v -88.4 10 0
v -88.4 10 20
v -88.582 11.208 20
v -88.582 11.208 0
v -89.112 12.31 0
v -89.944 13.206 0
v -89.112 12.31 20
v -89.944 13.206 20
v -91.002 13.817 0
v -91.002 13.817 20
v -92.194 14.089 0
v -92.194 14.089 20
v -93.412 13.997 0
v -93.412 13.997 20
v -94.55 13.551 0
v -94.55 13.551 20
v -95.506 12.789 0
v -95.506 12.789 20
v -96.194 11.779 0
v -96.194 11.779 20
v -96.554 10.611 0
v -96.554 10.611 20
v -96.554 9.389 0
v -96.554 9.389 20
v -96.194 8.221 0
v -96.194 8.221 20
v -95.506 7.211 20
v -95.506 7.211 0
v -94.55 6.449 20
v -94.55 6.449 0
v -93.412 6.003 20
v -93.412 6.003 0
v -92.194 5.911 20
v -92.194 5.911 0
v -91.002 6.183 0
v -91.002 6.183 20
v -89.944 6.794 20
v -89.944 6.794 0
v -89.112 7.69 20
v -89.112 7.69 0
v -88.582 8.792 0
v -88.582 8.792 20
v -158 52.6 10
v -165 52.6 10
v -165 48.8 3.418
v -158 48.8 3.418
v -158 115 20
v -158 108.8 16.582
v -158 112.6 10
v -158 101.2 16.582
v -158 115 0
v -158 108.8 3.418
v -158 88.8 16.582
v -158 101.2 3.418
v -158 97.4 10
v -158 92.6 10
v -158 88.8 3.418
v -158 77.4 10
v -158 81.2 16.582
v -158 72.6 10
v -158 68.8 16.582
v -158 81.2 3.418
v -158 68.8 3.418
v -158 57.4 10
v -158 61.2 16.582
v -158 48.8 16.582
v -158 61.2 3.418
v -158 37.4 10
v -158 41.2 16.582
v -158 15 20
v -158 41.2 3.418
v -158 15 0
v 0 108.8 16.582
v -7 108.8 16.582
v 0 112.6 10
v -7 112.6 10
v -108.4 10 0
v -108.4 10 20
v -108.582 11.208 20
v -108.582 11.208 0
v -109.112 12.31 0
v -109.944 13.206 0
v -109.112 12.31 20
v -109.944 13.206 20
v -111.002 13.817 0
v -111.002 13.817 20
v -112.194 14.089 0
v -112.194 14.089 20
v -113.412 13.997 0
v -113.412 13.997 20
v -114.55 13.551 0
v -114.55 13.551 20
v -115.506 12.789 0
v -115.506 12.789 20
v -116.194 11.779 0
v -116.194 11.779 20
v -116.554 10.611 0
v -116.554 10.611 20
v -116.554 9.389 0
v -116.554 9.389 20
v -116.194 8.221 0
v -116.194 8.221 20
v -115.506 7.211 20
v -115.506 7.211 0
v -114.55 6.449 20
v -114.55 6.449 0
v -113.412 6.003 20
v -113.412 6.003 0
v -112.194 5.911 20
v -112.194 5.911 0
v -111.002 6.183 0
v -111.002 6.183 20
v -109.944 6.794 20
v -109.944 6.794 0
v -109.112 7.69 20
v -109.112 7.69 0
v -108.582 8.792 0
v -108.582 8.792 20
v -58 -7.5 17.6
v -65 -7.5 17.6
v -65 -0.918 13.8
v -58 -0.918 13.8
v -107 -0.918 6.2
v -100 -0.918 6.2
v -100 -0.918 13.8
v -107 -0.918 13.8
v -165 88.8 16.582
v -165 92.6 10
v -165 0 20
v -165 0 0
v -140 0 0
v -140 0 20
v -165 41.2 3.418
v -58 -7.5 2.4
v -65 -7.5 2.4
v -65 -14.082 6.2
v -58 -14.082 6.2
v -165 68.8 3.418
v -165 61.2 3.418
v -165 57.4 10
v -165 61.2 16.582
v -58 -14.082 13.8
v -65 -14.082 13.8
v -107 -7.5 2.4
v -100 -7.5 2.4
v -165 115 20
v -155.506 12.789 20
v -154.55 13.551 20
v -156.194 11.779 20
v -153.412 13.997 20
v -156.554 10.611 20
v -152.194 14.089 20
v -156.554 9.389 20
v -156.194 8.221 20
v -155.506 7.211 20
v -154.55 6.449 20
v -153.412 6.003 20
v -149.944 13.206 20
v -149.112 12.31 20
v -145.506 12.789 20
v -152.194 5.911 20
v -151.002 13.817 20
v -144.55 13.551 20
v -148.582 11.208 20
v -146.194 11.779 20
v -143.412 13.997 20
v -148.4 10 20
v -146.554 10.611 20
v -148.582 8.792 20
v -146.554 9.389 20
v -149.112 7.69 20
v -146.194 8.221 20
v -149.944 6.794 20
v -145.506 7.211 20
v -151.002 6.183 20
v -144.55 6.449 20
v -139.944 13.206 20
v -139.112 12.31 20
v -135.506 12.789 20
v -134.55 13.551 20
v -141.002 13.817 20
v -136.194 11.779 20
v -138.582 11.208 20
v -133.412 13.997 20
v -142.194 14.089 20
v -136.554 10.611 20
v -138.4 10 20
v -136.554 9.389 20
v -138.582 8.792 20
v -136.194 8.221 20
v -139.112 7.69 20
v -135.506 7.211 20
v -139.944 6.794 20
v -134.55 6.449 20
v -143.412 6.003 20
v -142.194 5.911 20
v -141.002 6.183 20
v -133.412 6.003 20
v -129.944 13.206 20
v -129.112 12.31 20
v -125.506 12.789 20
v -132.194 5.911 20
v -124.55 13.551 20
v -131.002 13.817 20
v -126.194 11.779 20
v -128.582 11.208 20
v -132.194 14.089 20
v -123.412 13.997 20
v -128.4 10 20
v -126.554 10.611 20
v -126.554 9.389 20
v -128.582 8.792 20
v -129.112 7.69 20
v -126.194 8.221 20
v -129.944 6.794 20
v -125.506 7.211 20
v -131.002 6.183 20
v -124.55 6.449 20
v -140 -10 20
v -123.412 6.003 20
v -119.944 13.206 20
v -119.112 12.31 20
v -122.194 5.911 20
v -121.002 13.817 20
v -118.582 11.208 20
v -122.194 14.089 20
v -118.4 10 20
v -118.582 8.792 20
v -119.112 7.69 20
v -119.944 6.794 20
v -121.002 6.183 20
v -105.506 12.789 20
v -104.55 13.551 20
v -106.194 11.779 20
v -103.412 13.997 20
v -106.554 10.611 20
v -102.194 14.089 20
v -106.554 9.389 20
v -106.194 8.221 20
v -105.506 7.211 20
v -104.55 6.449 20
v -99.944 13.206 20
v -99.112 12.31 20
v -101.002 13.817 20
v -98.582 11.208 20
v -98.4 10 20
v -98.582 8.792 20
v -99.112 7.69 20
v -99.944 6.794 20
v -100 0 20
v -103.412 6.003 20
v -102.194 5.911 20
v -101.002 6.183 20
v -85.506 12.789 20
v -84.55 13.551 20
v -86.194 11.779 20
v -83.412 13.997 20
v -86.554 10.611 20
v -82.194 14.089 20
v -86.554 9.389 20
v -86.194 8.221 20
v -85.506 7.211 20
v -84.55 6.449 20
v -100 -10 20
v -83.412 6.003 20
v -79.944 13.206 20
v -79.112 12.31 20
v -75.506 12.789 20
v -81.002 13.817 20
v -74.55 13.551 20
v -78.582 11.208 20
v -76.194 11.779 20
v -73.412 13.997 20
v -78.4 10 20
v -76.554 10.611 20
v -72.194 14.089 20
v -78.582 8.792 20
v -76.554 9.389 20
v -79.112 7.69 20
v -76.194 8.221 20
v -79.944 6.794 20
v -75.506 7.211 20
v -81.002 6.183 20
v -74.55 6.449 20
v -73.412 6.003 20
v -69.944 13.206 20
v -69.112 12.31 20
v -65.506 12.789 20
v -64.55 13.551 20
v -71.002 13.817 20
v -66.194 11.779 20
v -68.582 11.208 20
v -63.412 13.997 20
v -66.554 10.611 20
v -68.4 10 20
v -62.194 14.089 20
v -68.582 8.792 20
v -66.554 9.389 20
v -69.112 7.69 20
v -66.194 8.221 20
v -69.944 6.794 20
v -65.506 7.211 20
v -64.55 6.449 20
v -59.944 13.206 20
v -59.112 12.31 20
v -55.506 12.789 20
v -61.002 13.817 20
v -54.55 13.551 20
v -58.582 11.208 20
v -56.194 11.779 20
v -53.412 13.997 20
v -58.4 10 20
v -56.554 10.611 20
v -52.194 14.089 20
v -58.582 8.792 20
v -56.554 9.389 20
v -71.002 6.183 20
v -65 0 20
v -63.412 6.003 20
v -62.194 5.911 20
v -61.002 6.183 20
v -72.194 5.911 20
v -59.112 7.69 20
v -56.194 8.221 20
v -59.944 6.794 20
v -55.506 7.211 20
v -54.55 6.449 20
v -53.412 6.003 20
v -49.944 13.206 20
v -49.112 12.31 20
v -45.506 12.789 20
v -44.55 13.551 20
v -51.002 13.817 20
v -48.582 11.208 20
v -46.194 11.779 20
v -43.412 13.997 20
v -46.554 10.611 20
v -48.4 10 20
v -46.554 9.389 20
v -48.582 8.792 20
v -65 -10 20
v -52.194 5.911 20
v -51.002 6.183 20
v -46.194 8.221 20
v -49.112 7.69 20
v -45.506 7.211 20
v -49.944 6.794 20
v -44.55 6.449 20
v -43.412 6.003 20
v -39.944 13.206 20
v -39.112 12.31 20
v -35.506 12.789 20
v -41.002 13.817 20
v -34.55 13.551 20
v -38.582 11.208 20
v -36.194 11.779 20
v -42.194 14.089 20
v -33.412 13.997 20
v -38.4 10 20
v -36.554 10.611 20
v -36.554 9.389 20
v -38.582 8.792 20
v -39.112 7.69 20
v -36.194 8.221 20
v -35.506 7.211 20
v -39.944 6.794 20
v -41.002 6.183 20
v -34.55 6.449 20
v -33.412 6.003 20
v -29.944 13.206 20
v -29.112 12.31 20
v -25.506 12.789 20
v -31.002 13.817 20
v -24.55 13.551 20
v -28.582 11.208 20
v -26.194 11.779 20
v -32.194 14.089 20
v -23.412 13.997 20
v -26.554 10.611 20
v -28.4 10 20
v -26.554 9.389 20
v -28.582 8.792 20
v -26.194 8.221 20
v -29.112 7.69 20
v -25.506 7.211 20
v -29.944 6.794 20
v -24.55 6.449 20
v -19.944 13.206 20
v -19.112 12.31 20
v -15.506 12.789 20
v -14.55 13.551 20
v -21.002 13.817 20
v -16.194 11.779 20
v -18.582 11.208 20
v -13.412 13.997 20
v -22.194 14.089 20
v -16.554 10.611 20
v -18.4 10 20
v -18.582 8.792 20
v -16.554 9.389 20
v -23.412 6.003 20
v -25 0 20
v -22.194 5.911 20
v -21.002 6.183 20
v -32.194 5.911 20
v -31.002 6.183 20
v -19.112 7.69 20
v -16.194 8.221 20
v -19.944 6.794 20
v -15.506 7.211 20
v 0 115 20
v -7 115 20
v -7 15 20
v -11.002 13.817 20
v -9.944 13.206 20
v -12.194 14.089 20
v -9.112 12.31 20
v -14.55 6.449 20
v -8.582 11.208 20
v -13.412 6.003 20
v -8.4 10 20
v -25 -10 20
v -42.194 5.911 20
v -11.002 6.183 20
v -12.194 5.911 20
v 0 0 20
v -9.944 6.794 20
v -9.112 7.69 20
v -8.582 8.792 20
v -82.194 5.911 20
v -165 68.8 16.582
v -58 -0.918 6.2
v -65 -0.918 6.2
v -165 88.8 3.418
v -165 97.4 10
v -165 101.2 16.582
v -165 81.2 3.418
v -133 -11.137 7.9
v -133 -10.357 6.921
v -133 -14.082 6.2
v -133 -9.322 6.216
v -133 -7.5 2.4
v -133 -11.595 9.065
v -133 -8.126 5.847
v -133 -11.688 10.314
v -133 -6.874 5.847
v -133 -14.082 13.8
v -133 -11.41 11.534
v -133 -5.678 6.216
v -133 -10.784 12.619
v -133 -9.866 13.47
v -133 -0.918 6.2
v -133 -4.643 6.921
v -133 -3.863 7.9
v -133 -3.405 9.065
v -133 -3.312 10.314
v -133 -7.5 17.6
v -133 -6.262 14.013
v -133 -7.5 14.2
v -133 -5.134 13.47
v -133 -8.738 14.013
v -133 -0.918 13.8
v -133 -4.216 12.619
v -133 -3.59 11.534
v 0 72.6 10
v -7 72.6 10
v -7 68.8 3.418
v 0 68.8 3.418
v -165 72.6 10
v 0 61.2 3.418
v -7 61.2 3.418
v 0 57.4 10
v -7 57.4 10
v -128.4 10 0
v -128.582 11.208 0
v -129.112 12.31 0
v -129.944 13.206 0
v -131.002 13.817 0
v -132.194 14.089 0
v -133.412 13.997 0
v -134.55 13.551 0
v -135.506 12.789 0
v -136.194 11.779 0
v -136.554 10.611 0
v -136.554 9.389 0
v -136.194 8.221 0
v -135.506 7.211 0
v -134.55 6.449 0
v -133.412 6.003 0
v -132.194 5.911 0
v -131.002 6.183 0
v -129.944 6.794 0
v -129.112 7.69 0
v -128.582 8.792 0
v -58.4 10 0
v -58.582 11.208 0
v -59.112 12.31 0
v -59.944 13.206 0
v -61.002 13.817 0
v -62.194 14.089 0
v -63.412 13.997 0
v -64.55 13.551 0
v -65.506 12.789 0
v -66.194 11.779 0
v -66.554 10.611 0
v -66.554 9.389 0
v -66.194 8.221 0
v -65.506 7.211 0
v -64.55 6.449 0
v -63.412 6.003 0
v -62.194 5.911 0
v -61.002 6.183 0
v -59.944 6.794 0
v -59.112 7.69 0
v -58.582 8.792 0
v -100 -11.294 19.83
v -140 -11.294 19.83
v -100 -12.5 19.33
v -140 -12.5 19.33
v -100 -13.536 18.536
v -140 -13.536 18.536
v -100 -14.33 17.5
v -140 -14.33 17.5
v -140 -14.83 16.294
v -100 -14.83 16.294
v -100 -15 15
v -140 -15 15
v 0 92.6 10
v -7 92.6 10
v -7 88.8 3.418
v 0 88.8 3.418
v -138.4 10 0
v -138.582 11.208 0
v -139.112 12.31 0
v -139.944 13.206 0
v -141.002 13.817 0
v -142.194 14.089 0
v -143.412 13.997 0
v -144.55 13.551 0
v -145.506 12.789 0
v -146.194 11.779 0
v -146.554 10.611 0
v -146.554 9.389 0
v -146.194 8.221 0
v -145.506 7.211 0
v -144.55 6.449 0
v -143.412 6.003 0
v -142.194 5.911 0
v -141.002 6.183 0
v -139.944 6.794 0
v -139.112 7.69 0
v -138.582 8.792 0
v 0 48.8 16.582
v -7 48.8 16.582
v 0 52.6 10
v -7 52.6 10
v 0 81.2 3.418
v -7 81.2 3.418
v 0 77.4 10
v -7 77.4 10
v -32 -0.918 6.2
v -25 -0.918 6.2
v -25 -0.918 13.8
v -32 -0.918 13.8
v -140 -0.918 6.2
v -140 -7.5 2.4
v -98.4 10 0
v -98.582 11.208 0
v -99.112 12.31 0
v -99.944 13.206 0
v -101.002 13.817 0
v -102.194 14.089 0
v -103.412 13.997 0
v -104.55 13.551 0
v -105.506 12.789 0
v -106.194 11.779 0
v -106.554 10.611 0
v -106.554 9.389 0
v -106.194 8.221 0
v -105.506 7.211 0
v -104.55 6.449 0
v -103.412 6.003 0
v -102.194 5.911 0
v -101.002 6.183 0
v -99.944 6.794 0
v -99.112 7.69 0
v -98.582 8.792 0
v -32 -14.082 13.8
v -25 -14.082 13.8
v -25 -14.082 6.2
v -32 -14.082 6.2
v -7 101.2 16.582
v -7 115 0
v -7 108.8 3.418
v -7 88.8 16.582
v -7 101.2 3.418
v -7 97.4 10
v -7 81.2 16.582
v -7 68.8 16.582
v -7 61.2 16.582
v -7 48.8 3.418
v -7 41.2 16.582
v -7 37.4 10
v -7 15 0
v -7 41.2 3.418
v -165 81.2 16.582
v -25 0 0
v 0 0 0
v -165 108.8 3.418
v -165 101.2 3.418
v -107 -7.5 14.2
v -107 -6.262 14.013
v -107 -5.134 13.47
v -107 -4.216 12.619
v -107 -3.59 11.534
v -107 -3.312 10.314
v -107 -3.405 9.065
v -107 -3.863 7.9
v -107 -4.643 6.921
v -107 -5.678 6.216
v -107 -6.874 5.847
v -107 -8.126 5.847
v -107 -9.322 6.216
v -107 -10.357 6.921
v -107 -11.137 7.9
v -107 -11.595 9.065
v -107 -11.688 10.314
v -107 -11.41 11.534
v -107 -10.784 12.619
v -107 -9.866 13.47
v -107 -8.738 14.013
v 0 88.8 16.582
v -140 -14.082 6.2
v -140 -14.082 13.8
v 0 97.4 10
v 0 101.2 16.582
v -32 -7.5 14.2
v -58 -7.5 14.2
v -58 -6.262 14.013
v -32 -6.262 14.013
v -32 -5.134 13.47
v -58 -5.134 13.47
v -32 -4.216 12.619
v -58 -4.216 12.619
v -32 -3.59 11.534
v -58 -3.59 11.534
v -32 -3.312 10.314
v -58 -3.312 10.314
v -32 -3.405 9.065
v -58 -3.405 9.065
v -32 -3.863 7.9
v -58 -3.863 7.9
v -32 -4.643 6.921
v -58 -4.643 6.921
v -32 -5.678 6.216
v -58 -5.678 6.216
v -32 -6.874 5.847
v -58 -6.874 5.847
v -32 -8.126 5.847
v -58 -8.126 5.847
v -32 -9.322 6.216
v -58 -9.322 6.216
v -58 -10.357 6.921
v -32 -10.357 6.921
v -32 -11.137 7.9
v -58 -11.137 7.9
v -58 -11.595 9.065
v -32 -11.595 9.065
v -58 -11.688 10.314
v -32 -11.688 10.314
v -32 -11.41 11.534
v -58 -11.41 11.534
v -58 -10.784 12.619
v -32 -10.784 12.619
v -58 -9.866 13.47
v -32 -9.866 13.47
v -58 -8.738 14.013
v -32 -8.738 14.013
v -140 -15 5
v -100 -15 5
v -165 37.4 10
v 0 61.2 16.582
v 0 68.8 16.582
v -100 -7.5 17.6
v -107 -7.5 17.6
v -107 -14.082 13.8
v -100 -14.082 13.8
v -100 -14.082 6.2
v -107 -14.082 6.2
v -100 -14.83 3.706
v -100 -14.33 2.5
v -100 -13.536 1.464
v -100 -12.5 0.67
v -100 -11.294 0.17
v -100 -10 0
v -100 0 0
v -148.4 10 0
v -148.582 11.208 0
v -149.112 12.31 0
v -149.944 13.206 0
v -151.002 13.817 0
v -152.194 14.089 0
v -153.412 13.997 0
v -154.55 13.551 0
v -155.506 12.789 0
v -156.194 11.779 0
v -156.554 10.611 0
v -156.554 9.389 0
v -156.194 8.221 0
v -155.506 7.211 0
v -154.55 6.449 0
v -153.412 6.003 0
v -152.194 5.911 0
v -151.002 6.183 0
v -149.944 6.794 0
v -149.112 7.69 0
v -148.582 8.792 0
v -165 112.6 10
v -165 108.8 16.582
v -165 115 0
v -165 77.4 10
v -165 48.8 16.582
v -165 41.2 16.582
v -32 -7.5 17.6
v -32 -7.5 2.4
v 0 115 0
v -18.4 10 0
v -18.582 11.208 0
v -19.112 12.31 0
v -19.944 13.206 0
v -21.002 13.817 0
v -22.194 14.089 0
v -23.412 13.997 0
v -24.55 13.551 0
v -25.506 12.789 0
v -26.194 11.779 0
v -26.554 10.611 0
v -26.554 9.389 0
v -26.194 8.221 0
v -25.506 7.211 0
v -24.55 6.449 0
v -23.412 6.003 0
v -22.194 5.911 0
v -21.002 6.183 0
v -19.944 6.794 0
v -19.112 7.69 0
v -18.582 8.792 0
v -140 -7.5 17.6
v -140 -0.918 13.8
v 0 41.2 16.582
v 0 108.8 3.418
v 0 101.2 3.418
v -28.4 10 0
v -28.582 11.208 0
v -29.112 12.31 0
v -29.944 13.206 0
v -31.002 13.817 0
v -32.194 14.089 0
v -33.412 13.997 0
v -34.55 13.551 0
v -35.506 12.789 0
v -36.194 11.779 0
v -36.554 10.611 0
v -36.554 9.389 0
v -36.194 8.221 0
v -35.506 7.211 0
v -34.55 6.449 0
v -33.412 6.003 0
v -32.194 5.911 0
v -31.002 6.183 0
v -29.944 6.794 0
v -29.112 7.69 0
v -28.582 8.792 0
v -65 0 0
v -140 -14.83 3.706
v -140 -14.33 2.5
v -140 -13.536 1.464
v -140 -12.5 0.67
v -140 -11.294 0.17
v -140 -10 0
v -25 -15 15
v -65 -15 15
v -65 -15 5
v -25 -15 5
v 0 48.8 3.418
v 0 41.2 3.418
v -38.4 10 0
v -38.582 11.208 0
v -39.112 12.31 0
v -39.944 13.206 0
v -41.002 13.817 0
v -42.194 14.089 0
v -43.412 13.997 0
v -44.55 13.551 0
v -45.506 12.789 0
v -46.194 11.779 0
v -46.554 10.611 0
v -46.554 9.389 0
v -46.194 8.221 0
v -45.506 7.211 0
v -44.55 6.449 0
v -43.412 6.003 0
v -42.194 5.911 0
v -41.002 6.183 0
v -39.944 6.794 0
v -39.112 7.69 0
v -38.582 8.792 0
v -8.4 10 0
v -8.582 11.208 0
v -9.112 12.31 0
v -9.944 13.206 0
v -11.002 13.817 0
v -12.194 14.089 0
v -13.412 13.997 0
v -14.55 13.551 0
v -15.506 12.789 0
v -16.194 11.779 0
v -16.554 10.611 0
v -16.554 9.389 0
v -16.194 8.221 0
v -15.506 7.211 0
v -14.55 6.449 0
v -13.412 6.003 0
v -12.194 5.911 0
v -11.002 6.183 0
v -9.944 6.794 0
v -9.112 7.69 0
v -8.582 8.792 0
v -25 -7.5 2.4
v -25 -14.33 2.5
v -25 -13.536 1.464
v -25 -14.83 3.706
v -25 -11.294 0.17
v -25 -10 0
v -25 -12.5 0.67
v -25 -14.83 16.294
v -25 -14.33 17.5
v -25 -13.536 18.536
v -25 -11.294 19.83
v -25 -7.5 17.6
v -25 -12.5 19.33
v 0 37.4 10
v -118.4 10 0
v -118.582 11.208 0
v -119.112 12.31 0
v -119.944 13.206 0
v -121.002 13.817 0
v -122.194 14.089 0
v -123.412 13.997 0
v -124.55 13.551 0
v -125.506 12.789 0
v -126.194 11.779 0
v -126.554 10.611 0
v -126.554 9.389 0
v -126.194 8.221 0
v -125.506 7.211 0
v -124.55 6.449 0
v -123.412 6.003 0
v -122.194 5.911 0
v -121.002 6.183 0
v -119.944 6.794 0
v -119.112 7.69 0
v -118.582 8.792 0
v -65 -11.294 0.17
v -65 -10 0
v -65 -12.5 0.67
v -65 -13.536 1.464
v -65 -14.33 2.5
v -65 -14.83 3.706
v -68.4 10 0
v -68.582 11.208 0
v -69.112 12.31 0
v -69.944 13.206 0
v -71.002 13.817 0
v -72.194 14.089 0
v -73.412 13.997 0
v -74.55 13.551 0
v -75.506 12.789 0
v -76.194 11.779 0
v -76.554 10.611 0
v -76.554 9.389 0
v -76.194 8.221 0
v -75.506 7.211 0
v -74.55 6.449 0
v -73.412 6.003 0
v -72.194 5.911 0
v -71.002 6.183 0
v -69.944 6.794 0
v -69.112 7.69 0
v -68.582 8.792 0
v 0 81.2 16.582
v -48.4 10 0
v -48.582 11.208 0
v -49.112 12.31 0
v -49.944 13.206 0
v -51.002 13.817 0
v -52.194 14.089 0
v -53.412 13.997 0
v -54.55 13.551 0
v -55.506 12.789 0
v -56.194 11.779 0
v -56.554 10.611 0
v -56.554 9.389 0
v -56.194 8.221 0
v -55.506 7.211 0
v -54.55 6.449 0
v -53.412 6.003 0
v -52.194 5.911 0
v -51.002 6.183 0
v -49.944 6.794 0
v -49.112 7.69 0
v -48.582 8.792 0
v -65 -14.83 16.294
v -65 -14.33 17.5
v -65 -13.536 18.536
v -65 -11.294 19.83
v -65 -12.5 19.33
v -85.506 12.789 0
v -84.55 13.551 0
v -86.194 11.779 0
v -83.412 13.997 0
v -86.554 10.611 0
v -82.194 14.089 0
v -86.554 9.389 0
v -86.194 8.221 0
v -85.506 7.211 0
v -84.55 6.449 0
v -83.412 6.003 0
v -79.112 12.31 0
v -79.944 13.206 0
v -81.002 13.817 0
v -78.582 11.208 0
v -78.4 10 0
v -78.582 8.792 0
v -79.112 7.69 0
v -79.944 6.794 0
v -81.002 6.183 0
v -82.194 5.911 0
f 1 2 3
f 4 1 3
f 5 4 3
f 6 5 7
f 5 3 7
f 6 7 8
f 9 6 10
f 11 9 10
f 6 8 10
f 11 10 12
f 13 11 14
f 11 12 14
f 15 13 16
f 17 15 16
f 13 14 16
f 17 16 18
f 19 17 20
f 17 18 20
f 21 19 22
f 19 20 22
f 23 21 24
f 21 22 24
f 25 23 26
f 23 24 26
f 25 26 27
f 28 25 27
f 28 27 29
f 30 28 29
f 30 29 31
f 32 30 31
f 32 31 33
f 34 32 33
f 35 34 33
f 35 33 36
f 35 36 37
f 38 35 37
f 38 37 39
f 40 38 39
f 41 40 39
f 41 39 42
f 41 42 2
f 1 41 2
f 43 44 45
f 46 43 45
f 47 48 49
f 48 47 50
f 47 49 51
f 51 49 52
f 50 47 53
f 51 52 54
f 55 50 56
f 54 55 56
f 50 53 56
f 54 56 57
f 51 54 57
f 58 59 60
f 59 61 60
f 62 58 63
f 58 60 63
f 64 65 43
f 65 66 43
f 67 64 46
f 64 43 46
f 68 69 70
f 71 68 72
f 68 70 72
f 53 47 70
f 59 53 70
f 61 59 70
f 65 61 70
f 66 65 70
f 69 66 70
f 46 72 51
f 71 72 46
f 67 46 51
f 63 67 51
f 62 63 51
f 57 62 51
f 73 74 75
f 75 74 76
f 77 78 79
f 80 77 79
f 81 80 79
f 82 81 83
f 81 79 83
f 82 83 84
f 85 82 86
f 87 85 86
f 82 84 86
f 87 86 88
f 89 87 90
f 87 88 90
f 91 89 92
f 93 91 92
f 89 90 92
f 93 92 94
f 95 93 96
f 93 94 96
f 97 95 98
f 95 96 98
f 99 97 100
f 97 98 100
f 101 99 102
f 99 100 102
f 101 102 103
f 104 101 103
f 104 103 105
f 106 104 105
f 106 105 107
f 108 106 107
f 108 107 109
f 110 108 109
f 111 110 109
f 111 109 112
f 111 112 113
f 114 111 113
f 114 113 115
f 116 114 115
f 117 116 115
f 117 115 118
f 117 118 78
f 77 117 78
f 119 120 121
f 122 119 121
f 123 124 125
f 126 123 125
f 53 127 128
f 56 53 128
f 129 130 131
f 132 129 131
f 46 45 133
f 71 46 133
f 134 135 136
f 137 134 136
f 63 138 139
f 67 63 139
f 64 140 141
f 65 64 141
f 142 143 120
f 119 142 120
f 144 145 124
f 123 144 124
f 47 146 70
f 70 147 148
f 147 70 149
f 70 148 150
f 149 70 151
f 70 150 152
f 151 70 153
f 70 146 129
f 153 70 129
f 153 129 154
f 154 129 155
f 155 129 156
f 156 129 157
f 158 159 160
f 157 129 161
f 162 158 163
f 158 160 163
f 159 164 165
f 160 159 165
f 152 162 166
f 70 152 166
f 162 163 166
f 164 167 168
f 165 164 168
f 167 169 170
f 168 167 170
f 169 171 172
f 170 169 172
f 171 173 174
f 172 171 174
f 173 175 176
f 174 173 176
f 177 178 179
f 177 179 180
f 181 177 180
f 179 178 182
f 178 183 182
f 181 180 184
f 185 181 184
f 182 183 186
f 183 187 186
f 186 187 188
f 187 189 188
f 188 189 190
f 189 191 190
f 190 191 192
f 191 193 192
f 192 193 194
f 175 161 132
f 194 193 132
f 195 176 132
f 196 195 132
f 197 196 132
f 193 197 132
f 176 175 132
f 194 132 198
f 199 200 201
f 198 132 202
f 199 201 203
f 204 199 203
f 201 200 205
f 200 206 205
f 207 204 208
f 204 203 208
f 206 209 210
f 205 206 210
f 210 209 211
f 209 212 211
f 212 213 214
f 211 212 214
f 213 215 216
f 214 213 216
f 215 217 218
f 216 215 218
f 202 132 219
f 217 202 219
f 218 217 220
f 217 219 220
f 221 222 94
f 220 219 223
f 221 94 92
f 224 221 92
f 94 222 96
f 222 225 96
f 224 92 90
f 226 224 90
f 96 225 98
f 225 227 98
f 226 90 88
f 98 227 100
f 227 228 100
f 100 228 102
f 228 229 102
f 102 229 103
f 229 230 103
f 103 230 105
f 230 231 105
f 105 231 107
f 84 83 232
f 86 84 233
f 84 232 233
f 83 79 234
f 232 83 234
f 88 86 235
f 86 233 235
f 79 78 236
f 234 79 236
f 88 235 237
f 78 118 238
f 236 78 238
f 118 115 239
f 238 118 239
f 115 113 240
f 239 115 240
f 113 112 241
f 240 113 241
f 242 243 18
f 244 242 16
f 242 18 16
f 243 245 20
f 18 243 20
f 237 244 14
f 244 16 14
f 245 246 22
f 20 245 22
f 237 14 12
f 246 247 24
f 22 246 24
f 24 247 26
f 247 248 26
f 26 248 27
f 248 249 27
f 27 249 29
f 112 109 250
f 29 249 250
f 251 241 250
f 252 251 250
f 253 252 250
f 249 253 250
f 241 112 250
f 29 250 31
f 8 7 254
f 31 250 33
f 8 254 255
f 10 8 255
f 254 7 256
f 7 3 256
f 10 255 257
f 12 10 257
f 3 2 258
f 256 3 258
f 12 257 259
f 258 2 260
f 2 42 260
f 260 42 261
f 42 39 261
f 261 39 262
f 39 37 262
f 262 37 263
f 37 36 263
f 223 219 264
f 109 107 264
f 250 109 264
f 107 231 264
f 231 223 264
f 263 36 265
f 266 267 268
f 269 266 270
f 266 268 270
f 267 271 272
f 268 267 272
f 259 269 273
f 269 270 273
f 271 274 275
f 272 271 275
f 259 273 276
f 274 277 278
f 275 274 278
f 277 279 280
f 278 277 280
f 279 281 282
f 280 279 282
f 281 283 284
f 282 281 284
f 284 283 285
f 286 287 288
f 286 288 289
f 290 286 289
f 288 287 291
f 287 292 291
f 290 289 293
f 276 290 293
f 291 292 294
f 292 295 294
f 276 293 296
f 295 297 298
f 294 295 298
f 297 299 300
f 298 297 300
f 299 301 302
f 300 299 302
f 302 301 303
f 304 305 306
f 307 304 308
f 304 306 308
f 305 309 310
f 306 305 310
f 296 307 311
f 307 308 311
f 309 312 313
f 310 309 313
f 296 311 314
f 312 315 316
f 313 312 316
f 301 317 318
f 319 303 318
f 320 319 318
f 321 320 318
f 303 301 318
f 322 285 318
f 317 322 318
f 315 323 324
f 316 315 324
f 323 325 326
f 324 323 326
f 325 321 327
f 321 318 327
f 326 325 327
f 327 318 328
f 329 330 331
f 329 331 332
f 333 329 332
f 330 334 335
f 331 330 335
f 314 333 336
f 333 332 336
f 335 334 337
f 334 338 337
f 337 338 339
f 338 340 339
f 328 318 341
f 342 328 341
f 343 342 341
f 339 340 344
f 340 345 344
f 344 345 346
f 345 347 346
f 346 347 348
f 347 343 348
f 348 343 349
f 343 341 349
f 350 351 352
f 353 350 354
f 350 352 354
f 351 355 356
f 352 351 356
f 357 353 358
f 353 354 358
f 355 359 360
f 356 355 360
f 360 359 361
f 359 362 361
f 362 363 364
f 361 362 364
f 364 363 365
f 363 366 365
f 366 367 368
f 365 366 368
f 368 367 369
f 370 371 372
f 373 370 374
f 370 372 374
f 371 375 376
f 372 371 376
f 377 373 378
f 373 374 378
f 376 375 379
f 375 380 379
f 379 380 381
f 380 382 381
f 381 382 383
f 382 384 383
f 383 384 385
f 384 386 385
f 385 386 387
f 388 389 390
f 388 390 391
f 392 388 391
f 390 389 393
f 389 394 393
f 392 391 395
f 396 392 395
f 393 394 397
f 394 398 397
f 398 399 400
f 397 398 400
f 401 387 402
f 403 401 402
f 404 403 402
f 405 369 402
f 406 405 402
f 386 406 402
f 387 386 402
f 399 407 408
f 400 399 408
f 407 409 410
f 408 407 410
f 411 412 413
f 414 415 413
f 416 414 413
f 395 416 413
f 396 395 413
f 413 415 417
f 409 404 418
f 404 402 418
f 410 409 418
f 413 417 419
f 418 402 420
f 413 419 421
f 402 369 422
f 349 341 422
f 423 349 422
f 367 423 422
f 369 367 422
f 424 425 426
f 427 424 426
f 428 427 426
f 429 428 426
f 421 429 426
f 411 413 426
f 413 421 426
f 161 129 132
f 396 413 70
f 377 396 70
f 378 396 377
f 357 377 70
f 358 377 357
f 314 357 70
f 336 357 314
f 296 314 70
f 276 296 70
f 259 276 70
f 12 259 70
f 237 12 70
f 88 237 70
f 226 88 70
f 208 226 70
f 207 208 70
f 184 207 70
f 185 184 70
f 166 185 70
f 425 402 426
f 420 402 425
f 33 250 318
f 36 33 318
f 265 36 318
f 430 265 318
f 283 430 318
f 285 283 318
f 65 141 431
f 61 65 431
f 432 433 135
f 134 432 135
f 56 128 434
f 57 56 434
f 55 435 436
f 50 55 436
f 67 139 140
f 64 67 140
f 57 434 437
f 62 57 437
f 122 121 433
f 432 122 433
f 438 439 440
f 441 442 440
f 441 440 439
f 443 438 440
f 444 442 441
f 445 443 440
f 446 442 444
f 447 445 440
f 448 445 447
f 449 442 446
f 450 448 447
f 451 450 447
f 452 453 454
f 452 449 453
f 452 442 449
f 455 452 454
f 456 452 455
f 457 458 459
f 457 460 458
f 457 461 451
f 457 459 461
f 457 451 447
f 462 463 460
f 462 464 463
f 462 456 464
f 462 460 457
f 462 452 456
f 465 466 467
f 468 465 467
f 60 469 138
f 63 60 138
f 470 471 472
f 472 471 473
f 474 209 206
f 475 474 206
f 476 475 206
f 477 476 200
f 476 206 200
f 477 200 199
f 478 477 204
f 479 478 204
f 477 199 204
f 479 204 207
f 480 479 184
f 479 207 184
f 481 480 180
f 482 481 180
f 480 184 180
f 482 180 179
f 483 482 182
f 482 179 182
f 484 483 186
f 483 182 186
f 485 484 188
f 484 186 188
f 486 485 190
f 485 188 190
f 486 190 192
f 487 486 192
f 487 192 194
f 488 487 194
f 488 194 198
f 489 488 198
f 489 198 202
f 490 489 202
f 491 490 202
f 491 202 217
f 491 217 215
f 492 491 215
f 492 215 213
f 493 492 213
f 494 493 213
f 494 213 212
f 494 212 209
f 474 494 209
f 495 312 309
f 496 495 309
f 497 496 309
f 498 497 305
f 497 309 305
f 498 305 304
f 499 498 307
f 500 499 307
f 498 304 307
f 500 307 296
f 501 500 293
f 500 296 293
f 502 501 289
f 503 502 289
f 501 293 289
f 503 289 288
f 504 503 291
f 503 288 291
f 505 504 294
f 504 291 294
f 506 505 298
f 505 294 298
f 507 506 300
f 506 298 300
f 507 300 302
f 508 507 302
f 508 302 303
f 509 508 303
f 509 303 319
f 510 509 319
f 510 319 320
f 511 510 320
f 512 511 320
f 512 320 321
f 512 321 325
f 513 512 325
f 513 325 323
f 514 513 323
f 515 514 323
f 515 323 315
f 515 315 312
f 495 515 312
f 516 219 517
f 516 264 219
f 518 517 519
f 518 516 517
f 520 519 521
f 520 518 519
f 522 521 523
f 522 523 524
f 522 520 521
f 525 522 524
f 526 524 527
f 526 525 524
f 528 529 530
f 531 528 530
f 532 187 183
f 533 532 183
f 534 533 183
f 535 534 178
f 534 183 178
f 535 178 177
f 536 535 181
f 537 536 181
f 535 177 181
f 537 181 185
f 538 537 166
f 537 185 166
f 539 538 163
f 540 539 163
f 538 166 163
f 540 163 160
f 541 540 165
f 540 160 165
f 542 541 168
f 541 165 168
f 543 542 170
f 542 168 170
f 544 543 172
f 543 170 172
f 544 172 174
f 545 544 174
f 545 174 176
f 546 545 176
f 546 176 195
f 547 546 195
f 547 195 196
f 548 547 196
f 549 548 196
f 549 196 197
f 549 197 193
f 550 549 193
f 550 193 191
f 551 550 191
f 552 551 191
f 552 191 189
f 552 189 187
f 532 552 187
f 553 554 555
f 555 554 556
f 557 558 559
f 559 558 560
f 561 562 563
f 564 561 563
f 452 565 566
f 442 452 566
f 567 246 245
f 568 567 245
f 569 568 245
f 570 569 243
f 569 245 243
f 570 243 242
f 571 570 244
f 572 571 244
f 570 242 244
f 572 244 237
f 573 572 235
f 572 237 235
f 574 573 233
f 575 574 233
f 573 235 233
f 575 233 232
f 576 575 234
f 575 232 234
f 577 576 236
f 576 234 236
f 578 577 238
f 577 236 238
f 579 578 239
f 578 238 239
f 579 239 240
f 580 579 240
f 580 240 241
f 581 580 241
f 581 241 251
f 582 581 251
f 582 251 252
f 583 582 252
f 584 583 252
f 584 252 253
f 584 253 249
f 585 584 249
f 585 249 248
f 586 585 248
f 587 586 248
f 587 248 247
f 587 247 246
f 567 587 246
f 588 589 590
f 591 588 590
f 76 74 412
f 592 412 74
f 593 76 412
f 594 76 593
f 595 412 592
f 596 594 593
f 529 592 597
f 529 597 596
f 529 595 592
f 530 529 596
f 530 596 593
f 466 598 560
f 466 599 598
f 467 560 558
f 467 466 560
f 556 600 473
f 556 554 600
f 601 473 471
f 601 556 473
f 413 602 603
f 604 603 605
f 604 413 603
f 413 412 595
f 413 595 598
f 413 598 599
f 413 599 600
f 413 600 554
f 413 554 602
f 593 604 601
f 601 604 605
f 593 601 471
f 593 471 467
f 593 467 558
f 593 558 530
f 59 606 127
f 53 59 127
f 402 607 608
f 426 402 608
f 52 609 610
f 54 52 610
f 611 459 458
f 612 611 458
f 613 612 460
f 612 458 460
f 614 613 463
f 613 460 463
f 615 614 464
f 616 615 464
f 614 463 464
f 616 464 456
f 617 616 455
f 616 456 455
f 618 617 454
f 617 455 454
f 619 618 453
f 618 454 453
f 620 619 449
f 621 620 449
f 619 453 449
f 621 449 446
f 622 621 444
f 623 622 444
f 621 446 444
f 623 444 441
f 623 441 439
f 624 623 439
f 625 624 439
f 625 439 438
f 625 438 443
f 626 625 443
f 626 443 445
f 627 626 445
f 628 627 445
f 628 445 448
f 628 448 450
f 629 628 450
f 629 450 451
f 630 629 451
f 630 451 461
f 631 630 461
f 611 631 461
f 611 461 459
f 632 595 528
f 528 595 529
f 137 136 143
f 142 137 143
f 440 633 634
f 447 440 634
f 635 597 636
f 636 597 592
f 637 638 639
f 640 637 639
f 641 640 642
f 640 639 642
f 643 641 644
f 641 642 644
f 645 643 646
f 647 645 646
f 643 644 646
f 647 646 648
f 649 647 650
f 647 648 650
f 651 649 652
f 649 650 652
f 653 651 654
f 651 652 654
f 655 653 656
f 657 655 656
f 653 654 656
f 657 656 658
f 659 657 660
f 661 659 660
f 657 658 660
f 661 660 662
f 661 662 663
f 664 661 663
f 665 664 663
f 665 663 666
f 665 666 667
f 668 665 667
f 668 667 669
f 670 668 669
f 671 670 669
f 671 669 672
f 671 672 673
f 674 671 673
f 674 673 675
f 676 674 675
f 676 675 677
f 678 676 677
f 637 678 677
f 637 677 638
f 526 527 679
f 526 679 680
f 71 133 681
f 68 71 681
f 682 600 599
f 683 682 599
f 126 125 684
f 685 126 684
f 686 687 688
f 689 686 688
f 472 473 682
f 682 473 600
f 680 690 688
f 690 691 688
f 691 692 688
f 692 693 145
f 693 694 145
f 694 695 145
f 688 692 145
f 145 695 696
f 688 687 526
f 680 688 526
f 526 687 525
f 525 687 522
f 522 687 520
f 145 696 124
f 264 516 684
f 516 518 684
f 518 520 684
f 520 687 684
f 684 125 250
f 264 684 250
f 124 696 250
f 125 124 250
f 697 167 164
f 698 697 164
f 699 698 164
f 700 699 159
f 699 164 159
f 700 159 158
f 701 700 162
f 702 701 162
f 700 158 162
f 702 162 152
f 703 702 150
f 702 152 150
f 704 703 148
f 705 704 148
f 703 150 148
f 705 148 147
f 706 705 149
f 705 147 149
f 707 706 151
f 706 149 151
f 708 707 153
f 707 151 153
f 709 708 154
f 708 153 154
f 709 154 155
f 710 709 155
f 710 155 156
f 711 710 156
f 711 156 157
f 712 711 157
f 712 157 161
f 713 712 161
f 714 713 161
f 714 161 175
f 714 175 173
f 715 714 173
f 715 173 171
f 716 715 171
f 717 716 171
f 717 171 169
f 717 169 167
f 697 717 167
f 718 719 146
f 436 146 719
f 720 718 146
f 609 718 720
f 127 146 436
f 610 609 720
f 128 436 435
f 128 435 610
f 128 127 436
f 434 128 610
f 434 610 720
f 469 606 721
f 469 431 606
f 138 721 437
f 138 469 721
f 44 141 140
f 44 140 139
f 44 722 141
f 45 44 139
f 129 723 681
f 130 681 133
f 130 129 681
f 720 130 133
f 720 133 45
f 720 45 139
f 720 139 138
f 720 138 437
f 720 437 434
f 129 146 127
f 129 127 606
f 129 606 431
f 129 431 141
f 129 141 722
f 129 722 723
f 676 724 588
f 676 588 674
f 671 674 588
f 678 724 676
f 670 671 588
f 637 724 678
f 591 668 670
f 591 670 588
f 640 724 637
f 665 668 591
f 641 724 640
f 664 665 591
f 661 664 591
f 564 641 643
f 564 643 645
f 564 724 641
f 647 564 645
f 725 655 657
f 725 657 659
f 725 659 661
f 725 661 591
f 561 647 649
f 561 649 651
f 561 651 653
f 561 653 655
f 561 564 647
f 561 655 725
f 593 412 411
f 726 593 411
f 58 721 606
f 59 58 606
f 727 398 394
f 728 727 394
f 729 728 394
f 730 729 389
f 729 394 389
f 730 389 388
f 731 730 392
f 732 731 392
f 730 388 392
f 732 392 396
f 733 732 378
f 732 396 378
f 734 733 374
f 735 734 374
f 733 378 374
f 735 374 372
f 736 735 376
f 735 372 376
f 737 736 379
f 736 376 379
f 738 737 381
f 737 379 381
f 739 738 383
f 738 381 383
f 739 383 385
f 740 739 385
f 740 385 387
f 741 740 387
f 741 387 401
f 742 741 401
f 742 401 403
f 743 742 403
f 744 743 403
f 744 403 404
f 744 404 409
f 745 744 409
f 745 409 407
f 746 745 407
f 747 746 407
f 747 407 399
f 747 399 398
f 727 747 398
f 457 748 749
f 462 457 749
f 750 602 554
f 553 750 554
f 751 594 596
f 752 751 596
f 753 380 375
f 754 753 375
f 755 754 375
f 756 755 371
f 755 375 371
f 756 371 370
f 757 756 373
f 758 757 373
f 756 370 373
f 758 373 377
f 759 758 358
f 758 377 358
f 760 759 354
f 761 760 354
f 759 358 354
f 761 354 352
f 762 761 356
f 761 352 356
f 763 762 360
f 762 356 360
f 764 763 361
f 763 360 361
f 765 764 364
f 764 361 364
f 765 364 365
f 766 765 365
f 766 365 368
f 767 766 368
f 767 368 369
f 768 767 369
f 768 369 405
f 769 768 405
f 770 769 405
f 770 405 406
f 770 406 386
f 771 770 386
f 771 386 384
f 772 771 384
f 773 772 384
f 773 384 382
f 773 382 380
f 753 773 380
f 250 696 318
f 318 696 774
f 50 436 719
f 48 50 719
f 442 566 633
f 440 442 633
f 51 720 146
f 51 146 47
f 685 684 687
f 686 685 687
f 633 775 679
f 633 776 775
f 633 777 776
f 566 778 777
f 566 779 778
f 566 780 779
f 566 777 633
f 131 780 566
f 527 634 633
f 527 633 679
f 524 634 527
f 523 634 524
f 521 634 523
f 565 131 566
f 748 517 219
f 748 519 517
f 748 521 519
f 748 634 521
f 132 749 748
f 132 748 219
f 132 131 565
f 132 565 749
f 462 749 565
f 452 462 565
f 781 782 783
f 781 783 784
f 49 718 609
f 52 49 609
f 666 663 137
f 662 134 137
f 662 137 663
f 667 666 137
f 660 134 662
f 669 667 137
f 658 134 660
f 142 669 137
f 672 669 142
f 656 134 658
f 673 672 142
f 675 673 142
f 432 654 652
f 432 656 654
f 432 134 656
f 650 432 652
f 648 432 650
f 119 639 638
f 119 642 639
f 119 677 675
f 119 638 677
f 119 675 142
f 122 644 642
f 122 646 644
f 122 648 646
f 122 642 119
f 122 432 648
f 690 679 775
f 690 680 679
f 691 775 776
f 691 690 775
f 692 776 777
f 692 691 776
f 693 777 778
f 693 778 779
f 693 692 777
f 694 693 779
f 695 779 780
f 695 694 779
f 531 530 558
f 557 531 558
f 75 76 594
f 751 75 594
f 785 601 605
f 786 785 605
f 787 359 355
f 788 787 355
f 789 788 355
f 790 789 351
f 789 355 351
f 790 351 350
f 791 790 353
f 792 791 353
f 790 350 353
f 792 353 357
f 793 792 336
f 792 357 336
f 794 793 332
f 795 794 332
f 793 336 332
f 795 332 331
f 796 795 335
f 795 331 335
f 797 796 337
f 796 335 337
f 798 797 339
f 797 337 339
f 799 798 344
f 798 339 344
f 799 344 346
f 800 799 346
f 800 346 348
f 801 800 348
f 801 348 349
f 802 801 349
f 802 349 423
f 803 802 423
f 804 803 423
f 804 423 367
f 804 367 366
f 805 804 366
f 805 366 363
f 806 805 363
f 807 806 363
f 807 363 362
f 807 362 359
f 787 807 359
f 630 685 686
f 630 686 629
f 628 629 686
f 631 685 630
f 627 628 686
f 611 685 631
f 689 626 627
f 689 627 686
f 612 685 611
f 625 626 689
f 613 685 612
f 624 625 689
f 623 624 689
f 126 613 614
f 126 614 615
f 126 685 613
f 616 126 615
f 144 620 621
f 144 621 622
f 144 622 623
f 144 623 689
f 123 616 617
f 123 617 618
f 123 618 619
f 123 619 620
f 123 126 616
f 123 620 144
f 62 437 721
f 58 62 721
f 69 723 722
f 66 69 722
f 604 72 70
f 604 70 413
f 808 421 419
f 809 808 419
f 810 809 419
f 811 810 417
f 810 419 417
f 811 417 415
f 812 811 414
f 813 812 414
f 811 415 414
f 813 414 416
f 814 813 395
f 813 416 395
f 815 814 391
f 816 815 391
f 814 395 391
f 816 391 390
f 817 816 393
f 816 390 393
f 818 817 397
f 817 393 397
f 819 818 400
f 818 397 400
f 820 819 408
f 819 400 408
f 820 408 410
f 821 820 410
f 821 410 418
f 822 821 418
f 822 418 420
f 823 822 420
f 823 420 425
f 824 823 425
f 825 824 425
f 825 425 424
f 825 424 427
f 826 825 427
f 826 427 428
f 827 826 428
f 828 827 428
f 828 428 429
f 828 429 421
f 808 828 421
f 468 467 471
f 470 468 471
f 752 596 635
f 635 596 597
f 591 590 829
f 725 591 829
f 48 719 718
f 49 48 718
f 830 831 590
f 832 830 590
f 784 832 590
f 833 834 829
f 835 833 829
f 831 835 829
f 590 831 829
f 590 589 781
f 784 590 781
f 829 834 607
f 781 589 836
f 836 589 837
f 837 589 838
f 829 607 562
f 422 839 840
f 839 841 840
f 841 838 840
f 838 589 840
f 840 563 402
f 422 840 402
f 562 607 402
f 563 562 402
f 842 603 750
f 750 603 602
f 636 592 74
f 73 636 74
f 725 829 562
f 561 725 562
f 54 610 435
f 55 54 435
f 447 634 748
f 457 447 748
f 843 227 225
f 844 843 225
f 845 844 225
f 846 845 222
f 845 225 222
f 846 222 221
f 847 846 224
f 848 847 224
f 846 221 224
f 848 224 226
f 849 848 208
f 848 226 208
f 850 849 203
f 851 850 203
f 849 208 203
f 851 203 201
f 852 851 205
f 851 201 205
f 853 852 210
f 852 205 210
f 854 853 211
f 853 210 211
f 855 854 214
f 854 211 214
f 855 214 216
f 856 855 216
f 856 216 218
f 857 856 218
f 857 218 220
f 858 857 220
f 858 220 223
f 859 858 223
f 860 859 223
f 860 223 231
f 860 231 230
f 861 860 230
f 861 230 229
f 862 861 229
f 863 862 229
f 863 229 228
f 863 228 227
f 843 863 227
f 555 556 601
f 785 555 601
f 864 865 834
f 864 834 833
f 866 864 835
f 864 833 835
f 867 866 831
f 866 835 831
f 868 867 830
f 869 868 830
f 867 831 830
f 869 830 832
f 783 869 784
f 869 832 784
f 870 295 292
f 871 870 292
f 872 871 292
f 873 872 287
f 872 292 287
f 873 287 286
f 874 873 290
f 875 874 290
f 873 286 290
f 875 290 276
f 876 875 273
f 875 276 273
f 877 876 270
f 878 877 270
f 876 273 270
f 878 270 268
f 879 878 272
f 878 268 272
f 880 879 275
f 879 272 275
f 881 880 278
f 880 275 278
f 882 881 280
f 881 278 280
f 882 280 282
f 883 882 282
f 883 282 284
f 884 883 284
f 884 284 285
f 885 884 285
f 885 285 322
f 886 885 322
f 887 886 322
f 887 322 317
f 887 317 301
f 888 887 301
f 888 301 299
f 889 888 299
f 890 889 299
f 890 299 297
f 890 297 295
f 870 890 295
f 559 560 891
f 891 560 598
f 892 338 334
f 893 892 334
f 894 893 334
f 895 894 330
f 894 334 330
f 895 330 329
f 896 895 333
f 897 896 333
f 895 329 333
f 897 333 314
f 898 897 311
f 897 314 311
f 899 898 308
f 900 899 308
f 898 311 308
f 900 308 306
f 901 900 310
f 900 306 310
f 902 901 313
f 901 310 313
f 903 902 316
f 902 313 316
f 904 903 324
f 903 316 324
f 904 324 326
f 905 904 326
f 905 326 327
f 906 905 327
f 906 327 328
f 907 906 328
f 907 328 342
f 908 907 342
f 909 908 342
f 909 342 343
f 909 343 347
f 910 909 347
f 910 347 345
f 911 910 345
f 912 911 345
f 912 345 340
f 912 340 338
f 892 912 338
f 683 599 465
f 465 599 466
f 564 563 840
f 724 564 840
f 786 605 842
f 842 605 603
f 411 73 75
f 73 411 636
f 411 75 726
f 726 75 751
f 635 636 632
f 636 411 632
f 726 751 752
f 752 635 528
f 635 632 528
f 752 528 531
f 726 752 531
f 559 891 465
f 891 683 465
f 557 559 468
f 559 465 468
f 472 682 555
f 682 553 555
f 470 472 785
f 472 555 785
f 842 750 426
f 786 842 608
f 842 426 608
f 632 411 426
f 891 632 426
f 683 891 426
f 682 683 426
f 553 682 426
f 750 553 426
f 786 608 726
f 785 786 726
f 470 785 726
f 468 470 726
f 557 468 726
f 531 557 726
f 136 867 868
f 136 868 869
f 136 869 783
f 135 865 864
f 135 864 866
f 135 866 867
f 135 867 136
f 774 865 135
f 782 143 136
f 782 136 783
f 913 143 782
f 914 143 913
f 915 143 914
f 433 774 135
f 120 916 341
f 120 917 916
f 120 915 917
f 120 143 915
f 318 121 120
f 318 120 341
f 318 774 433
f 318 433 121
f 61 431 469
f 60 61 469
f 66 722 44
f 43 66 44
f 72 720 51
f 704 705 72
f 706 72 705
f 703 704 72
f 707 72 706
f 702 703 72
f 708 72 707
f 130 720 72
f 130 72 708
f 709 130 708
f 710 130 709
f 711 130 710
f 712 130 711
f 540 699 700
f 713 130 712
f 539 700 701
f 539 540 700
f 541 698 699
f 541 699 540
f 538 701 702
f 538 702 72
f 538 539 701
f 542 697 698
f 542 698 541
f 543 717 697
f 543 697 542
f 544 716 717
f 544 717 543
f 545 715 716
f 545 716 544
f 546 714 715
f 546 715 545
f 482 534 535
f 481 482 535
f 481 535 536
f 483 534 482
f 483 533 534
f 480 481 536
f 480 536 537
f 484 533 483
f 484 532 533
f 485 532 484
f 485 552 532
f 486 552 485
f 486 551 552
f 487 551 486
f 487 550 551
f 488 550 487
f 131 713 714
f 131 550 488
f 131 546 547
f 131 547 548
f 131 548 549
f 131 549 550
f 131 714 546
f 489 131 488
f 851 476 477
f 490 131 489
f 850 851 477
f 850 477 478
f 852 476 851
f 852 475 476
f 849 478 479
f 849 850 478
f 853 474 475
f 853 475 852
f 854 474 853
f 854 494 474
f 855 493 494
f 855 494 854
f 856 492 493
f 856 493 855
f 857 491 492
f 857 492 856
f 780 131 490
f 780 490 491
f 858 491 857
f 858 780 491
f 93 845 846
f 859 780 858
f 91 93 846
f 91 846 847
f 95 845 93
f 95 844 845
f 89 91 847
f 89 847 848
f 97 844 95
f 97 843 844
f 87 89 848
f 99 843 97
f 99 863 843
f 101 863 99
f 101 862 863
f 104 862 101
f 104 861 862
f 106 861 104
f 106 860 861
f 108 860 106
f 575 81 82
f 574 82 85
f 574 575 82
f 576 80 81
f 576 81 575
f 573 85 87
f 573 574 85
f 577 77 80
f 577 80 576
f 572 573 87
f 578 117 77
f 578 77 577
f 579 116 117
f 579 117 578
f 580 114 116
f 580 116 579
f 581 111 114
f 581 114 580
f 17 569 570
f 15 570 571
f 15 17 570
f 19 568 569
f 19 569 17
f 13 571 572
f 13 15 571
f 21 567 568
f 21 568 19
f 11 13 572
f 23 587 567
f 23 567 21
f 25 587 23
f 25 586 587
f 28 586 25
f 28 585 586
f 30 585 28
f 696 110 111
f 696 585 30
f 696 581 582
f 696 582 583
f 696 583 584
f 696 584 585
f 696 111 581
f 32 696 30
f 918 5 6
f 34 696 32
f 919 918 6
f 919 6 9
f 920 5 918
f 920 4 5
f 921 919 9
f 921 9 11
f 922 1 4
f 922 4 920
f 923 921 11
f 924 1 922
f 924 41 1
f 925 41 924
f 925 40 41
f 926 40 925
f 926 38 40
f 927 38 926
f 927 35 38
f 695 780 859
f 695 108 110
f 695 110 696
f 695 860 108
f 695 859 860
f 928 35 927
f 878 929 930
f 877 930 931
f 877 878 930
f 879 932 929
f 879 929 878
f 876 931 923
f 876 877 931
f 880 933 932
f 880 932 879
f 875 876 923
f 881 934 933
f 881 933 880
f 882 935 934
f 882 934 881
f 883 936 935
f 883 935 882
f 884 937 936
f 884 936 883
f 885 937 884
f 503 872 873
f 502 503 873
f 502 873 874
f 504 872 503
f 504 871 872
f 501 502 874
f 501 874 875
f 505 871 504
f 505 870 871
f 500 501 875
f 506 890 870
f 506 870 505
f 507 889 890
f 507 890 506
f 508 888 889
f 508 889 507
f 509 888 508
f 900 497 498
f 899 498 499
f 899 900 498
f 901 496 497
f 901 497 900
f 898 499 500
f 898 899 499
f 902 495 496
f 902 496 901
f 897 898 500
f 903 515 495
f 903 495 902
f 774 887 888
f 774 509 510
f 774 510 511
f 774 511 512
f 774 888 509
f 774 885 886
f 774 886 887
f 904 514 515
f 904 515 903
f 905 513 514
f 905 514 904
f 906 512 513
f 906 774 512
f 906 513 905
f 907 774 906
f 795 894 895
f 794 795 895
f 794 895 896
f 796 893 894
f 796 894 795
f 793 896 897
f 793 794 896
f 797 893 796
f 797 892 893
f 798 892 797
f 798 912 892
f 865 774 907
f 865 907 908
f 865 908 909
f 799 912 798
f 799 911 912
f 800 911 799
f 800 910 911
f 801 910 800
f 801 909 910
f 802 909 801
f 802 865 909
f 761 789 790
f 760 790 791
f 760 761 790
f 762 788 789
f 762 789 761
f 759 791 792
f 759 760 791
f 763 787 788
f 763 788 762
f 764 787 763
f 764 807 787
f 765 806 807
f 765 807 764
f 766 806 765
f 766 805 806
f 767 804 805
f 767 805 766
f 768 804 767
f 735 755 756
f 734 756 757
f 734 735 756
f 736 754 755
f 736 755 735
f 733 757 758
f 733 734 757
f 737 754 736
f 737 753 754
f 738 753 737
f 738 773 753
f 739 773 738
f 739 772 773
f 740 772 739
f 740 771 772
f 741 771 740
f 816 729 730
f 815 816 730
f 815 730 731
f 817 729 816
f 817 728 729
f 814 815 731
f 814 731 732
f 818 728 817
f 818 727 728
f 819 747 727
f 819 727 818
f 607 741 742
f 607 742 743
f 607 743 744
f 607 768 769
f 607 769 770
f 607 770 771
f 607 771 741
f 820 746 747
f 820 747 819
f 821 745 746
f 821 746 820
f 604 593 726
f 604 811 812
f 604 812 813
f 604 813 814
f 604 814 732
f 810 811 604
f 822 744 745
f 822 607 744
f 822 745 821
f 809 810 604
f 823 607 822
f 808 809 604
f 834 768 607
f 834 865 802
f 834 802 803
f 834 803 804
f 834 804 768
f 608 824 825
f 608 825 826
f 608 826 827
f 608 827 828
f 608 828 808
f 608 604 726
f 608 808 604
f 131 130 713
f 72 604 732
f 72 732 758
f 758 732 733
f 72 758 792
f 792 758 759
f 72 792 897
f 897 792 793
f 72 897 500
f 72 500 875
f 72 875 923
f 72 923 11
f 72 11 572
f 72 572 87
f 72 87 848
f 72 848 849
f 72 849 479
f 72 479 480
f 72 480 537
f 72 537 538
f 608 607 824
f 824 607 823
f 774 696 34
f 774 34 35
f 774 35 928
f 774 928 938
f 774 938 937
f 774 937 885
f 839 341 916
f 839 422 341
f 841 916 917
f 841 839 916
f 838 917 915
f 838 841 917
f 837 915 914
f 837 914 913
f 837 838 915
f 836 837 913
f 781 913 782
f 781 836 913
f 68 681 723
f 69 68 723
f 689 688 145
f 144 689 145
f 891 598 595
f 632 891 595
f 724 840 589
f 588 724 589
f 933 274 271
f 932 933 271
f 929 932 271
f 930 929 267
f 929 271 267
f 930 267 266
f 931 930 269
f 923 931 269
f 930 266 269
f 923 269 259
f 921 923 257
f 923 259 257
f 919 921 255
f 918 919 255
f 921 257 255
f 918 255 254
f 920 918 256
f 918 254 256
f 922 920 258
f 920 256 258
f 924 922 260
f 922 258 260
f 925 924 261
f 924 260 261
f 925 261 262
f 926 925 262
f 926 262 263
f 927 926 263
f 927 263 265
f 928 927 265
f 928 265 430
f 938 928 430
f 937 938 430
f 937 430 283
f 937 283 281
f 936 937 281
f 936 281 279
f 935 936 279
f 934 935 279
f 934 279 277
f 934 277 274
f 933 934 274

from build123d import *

# Parameters (mm, degrees)
SKETCH_1_W                 = 165
SKETCH_1_H                 = 20
EXTRUDE_1_DEPTH            = 15
SKETCH_2_W                 = 7
SKETCH_2_H                 = 20
EXTRUDE_2_DEPTH            = 100
SKETCH_3_R                 = 4.1
CUT_EXTRUDE_1_DEPTH        = 21
PATTERN_LINEAR_1_COUNT     = 8
PATTERN_LINEAR_1_PITCH     = 10
PATTERN_LINEAR_1_COL_COUNT = 8
PATTERN_LINEAR_1_COL_PITCH = 10
CUT_EXTRUDE_2_DEPTH        = 166
SKETCH_5_W                 = 40
SKETCH_5_H                 = 20
EXTRUDE_3_DEPTH            = 15
SKETCH_6_R                 = 4.2
CUT_EXTRUDE_4_DEPTH        = 141
CUT_EXTRUDE_5_DEPTH        = 7
CUT_EXTRUDE_6_DEPTH        = 7
CUT_EXTRUDE_7_DEPTH        = 7
CUT_EXTRUDE_8_DEPTH        = 7
FILLET_1_R                 = 5
FILLET_2_R                 = 5
PATTERN_LINEAR_2_COUNT     = 4
PATTERN_LINEAR_2_PITCH     = 20


with BuildPart() as part:
    # Эскиз1 → Бобышка-Вытянуть1 (new body)
    with BuildSketch(Plane(origin=(0, 0, 0), x_dir=(1, 0, 0), z_dir=(0, 1, 0))):
        with Locations((-82.5, -10)):
            Rectangle(SKETCH_1_W, SKETCH_1_H)
    extrude(amount=EXTRUDE_1_DEPTH)

    # Эскиз2 → Бобышка-Вытянуть2 (add)
    with BuildSketch(Plane(origin=(0, 15, 0), x_dir=(1, 0, 0), z_dir=(0, 1, 0))):
        with Locations((-161.5, -10)):
            Rectangle(SKETCH_2_W, SKETCH_2_H)
        with Locations((-3.5, -10)):
            Rectangle(SKETCH_2_W, SKETCH_2_H)
    extrude(amount=EXTRUDE_2_DEPTH)

    # Эскиз3 → Вырез-Вытянуть1 (cut, through all)
    with BuildSketch(Plane.XY.offset(20)):
        with Locations((-82.5, 10)):
            Circle(SKETCH_3_R)
    cut_extrude_1 = extrude(amount=-CUT_EXTRUDE_1_DEPTH, mode=Mode.SUBTRACT)

    # Линейный массив1: Вырез-Вытянуть1 ×8
    with Locations(*[(-i * PATTERN_LINEAR_1_PITCH, 0, 0) for i in range(1, PATTERN_LINEAR_1_COUNT)]):
        add(cut_extrude_1, mode=Mode.SUBTRACT)

    # Линейный массив1 col: Вырез-Вытянуть1 ×8
    with Locations(*[(i * PATTERN_LINEAR_1_COL_PITCH, 0, 0) for i in range(1, PATTERN_LINEAR_1_COL_COUNT)]):
        add(cut_extrude_1, mode=Mode.SUBTRACT)

    # Эскиз4 → Вырез-Вытянуть2 (cut, through all)
    with BuildSketch(Plane.ZY.offset(165)):
        Polygon((10, 97.4), (16.581793069, 101.2), (16.581793069, 108.8), (10, 112.6), (3.418206931, 108.8), (3.418206931, 101.2), align=None)
    cut_extrude_2 = extrude(amount=-CUT_EXTRUDE_2_DEPTH, mode=Mode.SUBTRACT)

    # Эскиз5 → Бобышка-Вытянуть3 (add)
    with BuildSketch(Plane.XZ):
        with Locations((-120, 10)):
            Rectangle(SKETCH_5_W, SKETCH_5_H)
        with Locations((-45, 10)):
            Rectangle(SKETCH_5_W, SKETCH_5_H)
    extrude(amount=EXTRUDE_3_DEPTH)

    # Эскиз6 → Вырез-Вытянуть4 (cut, through all)
    with BuildSketch(Plane.ZY.offset(140)):
        with Locations((10, -7.5)):
            Circle(SKETCH_6_R)
    extrude(amount=-CUT_EXTRUDE_4_DEPTH, mode=Mode.SUBTRACT)

    # Эскиз7 → Вырез-Вытянуть5 (cut)
    with BuildSketch(Plane.ZY.offset(140)):
        Polygon((17.6, -7.5), (13.8, -0.918206931), (6.2, -0.918206931), (2.4, -7.5), (6.2, -14.081793069), (13.8, -14.081793069), align=None)
    extrude(amount=-CUT_EXTRUDE_5_DEPTH, mode=Mode.SUBTRACT)

    # Эскиз8 → Вырез-Вытянуть6 (cut)
    with BuildSketch(Plane(origin=(-100, 0, 0), x_dir=(0, 0, -1), z_dir=(1, 0, 0))):
        Polygon((-17.6, -7.5), (-13.8, -14.081793069), (-6.2, -14.081793069), (-2.4, -7.5), (-6.2, -0.918206931), (-13.8, -0.918206931), align=None)
    extrude(amount=-CUT_EXTRUDE_6_DEPTH, mode=Mode.SUBTRACT)

    # Эскиз9 → Вырез-Вытянуть7 (cut)
    with BuildSketch(Plane.ZY.offset(65)):
        Polygon((17.6, -7.5), (13.8, -0.918206931), (6.2, -0.918206931), (2.4, -7.5), (6.2, -14.081793069), (13.8, -14.081793069), align=None)
    extrude(amount=-CUT_EXTRUDE_7_DEPTH, mode=Mode.SUBTRACT)

    # Эскиз10 → Вырез-Вытянуть8 (cut)
    with BuildSketch(Plane(origin=(-25, 0, 0), x_dir=(0, 0, -1), z_dir=(1, 0, 0))):
        Polygon((-2.4, -7.5), (-6.2, -0.918206931), (-13.8, -0.918206931), (-17.6, -7.5), (-13.8, -14.081793069), (-6.2, -14.081793069), align=None)
    extrude(amount=-CUT_EXTRUDE_8_DEPTH, mode=Mode.SUBTRACT)

    # Скругление1
    fillet_1_edges = [part.edges().sort_by_distance(p)[0] for p in [
        (-45, -15, 0),
        (-45, -15, 20),
    ]]
    fillet(fillet_1_edges, radius=FILLET_1_R)

    # Скругление2
    fillet_2_edges = [part.edges().sort_by_distance(p)[0] for p in [
        (-120, -15, 0),
        (-120, -15, 20),
    ]]
    fillet(fillet_2_edges, radius=FILLET_2_R)

    # Линейный массив2: Вырез-Вытянуть2 ×4
    with Locations(*[(0, -i * PATTERN_LINEAR_2_PITCH, 0) for i in range(1, PATTERN_LINEAR_2_COUNT)]):
        add(cut_extrude_2, mode=Mode.SUBTRACT)


solid = part.part
